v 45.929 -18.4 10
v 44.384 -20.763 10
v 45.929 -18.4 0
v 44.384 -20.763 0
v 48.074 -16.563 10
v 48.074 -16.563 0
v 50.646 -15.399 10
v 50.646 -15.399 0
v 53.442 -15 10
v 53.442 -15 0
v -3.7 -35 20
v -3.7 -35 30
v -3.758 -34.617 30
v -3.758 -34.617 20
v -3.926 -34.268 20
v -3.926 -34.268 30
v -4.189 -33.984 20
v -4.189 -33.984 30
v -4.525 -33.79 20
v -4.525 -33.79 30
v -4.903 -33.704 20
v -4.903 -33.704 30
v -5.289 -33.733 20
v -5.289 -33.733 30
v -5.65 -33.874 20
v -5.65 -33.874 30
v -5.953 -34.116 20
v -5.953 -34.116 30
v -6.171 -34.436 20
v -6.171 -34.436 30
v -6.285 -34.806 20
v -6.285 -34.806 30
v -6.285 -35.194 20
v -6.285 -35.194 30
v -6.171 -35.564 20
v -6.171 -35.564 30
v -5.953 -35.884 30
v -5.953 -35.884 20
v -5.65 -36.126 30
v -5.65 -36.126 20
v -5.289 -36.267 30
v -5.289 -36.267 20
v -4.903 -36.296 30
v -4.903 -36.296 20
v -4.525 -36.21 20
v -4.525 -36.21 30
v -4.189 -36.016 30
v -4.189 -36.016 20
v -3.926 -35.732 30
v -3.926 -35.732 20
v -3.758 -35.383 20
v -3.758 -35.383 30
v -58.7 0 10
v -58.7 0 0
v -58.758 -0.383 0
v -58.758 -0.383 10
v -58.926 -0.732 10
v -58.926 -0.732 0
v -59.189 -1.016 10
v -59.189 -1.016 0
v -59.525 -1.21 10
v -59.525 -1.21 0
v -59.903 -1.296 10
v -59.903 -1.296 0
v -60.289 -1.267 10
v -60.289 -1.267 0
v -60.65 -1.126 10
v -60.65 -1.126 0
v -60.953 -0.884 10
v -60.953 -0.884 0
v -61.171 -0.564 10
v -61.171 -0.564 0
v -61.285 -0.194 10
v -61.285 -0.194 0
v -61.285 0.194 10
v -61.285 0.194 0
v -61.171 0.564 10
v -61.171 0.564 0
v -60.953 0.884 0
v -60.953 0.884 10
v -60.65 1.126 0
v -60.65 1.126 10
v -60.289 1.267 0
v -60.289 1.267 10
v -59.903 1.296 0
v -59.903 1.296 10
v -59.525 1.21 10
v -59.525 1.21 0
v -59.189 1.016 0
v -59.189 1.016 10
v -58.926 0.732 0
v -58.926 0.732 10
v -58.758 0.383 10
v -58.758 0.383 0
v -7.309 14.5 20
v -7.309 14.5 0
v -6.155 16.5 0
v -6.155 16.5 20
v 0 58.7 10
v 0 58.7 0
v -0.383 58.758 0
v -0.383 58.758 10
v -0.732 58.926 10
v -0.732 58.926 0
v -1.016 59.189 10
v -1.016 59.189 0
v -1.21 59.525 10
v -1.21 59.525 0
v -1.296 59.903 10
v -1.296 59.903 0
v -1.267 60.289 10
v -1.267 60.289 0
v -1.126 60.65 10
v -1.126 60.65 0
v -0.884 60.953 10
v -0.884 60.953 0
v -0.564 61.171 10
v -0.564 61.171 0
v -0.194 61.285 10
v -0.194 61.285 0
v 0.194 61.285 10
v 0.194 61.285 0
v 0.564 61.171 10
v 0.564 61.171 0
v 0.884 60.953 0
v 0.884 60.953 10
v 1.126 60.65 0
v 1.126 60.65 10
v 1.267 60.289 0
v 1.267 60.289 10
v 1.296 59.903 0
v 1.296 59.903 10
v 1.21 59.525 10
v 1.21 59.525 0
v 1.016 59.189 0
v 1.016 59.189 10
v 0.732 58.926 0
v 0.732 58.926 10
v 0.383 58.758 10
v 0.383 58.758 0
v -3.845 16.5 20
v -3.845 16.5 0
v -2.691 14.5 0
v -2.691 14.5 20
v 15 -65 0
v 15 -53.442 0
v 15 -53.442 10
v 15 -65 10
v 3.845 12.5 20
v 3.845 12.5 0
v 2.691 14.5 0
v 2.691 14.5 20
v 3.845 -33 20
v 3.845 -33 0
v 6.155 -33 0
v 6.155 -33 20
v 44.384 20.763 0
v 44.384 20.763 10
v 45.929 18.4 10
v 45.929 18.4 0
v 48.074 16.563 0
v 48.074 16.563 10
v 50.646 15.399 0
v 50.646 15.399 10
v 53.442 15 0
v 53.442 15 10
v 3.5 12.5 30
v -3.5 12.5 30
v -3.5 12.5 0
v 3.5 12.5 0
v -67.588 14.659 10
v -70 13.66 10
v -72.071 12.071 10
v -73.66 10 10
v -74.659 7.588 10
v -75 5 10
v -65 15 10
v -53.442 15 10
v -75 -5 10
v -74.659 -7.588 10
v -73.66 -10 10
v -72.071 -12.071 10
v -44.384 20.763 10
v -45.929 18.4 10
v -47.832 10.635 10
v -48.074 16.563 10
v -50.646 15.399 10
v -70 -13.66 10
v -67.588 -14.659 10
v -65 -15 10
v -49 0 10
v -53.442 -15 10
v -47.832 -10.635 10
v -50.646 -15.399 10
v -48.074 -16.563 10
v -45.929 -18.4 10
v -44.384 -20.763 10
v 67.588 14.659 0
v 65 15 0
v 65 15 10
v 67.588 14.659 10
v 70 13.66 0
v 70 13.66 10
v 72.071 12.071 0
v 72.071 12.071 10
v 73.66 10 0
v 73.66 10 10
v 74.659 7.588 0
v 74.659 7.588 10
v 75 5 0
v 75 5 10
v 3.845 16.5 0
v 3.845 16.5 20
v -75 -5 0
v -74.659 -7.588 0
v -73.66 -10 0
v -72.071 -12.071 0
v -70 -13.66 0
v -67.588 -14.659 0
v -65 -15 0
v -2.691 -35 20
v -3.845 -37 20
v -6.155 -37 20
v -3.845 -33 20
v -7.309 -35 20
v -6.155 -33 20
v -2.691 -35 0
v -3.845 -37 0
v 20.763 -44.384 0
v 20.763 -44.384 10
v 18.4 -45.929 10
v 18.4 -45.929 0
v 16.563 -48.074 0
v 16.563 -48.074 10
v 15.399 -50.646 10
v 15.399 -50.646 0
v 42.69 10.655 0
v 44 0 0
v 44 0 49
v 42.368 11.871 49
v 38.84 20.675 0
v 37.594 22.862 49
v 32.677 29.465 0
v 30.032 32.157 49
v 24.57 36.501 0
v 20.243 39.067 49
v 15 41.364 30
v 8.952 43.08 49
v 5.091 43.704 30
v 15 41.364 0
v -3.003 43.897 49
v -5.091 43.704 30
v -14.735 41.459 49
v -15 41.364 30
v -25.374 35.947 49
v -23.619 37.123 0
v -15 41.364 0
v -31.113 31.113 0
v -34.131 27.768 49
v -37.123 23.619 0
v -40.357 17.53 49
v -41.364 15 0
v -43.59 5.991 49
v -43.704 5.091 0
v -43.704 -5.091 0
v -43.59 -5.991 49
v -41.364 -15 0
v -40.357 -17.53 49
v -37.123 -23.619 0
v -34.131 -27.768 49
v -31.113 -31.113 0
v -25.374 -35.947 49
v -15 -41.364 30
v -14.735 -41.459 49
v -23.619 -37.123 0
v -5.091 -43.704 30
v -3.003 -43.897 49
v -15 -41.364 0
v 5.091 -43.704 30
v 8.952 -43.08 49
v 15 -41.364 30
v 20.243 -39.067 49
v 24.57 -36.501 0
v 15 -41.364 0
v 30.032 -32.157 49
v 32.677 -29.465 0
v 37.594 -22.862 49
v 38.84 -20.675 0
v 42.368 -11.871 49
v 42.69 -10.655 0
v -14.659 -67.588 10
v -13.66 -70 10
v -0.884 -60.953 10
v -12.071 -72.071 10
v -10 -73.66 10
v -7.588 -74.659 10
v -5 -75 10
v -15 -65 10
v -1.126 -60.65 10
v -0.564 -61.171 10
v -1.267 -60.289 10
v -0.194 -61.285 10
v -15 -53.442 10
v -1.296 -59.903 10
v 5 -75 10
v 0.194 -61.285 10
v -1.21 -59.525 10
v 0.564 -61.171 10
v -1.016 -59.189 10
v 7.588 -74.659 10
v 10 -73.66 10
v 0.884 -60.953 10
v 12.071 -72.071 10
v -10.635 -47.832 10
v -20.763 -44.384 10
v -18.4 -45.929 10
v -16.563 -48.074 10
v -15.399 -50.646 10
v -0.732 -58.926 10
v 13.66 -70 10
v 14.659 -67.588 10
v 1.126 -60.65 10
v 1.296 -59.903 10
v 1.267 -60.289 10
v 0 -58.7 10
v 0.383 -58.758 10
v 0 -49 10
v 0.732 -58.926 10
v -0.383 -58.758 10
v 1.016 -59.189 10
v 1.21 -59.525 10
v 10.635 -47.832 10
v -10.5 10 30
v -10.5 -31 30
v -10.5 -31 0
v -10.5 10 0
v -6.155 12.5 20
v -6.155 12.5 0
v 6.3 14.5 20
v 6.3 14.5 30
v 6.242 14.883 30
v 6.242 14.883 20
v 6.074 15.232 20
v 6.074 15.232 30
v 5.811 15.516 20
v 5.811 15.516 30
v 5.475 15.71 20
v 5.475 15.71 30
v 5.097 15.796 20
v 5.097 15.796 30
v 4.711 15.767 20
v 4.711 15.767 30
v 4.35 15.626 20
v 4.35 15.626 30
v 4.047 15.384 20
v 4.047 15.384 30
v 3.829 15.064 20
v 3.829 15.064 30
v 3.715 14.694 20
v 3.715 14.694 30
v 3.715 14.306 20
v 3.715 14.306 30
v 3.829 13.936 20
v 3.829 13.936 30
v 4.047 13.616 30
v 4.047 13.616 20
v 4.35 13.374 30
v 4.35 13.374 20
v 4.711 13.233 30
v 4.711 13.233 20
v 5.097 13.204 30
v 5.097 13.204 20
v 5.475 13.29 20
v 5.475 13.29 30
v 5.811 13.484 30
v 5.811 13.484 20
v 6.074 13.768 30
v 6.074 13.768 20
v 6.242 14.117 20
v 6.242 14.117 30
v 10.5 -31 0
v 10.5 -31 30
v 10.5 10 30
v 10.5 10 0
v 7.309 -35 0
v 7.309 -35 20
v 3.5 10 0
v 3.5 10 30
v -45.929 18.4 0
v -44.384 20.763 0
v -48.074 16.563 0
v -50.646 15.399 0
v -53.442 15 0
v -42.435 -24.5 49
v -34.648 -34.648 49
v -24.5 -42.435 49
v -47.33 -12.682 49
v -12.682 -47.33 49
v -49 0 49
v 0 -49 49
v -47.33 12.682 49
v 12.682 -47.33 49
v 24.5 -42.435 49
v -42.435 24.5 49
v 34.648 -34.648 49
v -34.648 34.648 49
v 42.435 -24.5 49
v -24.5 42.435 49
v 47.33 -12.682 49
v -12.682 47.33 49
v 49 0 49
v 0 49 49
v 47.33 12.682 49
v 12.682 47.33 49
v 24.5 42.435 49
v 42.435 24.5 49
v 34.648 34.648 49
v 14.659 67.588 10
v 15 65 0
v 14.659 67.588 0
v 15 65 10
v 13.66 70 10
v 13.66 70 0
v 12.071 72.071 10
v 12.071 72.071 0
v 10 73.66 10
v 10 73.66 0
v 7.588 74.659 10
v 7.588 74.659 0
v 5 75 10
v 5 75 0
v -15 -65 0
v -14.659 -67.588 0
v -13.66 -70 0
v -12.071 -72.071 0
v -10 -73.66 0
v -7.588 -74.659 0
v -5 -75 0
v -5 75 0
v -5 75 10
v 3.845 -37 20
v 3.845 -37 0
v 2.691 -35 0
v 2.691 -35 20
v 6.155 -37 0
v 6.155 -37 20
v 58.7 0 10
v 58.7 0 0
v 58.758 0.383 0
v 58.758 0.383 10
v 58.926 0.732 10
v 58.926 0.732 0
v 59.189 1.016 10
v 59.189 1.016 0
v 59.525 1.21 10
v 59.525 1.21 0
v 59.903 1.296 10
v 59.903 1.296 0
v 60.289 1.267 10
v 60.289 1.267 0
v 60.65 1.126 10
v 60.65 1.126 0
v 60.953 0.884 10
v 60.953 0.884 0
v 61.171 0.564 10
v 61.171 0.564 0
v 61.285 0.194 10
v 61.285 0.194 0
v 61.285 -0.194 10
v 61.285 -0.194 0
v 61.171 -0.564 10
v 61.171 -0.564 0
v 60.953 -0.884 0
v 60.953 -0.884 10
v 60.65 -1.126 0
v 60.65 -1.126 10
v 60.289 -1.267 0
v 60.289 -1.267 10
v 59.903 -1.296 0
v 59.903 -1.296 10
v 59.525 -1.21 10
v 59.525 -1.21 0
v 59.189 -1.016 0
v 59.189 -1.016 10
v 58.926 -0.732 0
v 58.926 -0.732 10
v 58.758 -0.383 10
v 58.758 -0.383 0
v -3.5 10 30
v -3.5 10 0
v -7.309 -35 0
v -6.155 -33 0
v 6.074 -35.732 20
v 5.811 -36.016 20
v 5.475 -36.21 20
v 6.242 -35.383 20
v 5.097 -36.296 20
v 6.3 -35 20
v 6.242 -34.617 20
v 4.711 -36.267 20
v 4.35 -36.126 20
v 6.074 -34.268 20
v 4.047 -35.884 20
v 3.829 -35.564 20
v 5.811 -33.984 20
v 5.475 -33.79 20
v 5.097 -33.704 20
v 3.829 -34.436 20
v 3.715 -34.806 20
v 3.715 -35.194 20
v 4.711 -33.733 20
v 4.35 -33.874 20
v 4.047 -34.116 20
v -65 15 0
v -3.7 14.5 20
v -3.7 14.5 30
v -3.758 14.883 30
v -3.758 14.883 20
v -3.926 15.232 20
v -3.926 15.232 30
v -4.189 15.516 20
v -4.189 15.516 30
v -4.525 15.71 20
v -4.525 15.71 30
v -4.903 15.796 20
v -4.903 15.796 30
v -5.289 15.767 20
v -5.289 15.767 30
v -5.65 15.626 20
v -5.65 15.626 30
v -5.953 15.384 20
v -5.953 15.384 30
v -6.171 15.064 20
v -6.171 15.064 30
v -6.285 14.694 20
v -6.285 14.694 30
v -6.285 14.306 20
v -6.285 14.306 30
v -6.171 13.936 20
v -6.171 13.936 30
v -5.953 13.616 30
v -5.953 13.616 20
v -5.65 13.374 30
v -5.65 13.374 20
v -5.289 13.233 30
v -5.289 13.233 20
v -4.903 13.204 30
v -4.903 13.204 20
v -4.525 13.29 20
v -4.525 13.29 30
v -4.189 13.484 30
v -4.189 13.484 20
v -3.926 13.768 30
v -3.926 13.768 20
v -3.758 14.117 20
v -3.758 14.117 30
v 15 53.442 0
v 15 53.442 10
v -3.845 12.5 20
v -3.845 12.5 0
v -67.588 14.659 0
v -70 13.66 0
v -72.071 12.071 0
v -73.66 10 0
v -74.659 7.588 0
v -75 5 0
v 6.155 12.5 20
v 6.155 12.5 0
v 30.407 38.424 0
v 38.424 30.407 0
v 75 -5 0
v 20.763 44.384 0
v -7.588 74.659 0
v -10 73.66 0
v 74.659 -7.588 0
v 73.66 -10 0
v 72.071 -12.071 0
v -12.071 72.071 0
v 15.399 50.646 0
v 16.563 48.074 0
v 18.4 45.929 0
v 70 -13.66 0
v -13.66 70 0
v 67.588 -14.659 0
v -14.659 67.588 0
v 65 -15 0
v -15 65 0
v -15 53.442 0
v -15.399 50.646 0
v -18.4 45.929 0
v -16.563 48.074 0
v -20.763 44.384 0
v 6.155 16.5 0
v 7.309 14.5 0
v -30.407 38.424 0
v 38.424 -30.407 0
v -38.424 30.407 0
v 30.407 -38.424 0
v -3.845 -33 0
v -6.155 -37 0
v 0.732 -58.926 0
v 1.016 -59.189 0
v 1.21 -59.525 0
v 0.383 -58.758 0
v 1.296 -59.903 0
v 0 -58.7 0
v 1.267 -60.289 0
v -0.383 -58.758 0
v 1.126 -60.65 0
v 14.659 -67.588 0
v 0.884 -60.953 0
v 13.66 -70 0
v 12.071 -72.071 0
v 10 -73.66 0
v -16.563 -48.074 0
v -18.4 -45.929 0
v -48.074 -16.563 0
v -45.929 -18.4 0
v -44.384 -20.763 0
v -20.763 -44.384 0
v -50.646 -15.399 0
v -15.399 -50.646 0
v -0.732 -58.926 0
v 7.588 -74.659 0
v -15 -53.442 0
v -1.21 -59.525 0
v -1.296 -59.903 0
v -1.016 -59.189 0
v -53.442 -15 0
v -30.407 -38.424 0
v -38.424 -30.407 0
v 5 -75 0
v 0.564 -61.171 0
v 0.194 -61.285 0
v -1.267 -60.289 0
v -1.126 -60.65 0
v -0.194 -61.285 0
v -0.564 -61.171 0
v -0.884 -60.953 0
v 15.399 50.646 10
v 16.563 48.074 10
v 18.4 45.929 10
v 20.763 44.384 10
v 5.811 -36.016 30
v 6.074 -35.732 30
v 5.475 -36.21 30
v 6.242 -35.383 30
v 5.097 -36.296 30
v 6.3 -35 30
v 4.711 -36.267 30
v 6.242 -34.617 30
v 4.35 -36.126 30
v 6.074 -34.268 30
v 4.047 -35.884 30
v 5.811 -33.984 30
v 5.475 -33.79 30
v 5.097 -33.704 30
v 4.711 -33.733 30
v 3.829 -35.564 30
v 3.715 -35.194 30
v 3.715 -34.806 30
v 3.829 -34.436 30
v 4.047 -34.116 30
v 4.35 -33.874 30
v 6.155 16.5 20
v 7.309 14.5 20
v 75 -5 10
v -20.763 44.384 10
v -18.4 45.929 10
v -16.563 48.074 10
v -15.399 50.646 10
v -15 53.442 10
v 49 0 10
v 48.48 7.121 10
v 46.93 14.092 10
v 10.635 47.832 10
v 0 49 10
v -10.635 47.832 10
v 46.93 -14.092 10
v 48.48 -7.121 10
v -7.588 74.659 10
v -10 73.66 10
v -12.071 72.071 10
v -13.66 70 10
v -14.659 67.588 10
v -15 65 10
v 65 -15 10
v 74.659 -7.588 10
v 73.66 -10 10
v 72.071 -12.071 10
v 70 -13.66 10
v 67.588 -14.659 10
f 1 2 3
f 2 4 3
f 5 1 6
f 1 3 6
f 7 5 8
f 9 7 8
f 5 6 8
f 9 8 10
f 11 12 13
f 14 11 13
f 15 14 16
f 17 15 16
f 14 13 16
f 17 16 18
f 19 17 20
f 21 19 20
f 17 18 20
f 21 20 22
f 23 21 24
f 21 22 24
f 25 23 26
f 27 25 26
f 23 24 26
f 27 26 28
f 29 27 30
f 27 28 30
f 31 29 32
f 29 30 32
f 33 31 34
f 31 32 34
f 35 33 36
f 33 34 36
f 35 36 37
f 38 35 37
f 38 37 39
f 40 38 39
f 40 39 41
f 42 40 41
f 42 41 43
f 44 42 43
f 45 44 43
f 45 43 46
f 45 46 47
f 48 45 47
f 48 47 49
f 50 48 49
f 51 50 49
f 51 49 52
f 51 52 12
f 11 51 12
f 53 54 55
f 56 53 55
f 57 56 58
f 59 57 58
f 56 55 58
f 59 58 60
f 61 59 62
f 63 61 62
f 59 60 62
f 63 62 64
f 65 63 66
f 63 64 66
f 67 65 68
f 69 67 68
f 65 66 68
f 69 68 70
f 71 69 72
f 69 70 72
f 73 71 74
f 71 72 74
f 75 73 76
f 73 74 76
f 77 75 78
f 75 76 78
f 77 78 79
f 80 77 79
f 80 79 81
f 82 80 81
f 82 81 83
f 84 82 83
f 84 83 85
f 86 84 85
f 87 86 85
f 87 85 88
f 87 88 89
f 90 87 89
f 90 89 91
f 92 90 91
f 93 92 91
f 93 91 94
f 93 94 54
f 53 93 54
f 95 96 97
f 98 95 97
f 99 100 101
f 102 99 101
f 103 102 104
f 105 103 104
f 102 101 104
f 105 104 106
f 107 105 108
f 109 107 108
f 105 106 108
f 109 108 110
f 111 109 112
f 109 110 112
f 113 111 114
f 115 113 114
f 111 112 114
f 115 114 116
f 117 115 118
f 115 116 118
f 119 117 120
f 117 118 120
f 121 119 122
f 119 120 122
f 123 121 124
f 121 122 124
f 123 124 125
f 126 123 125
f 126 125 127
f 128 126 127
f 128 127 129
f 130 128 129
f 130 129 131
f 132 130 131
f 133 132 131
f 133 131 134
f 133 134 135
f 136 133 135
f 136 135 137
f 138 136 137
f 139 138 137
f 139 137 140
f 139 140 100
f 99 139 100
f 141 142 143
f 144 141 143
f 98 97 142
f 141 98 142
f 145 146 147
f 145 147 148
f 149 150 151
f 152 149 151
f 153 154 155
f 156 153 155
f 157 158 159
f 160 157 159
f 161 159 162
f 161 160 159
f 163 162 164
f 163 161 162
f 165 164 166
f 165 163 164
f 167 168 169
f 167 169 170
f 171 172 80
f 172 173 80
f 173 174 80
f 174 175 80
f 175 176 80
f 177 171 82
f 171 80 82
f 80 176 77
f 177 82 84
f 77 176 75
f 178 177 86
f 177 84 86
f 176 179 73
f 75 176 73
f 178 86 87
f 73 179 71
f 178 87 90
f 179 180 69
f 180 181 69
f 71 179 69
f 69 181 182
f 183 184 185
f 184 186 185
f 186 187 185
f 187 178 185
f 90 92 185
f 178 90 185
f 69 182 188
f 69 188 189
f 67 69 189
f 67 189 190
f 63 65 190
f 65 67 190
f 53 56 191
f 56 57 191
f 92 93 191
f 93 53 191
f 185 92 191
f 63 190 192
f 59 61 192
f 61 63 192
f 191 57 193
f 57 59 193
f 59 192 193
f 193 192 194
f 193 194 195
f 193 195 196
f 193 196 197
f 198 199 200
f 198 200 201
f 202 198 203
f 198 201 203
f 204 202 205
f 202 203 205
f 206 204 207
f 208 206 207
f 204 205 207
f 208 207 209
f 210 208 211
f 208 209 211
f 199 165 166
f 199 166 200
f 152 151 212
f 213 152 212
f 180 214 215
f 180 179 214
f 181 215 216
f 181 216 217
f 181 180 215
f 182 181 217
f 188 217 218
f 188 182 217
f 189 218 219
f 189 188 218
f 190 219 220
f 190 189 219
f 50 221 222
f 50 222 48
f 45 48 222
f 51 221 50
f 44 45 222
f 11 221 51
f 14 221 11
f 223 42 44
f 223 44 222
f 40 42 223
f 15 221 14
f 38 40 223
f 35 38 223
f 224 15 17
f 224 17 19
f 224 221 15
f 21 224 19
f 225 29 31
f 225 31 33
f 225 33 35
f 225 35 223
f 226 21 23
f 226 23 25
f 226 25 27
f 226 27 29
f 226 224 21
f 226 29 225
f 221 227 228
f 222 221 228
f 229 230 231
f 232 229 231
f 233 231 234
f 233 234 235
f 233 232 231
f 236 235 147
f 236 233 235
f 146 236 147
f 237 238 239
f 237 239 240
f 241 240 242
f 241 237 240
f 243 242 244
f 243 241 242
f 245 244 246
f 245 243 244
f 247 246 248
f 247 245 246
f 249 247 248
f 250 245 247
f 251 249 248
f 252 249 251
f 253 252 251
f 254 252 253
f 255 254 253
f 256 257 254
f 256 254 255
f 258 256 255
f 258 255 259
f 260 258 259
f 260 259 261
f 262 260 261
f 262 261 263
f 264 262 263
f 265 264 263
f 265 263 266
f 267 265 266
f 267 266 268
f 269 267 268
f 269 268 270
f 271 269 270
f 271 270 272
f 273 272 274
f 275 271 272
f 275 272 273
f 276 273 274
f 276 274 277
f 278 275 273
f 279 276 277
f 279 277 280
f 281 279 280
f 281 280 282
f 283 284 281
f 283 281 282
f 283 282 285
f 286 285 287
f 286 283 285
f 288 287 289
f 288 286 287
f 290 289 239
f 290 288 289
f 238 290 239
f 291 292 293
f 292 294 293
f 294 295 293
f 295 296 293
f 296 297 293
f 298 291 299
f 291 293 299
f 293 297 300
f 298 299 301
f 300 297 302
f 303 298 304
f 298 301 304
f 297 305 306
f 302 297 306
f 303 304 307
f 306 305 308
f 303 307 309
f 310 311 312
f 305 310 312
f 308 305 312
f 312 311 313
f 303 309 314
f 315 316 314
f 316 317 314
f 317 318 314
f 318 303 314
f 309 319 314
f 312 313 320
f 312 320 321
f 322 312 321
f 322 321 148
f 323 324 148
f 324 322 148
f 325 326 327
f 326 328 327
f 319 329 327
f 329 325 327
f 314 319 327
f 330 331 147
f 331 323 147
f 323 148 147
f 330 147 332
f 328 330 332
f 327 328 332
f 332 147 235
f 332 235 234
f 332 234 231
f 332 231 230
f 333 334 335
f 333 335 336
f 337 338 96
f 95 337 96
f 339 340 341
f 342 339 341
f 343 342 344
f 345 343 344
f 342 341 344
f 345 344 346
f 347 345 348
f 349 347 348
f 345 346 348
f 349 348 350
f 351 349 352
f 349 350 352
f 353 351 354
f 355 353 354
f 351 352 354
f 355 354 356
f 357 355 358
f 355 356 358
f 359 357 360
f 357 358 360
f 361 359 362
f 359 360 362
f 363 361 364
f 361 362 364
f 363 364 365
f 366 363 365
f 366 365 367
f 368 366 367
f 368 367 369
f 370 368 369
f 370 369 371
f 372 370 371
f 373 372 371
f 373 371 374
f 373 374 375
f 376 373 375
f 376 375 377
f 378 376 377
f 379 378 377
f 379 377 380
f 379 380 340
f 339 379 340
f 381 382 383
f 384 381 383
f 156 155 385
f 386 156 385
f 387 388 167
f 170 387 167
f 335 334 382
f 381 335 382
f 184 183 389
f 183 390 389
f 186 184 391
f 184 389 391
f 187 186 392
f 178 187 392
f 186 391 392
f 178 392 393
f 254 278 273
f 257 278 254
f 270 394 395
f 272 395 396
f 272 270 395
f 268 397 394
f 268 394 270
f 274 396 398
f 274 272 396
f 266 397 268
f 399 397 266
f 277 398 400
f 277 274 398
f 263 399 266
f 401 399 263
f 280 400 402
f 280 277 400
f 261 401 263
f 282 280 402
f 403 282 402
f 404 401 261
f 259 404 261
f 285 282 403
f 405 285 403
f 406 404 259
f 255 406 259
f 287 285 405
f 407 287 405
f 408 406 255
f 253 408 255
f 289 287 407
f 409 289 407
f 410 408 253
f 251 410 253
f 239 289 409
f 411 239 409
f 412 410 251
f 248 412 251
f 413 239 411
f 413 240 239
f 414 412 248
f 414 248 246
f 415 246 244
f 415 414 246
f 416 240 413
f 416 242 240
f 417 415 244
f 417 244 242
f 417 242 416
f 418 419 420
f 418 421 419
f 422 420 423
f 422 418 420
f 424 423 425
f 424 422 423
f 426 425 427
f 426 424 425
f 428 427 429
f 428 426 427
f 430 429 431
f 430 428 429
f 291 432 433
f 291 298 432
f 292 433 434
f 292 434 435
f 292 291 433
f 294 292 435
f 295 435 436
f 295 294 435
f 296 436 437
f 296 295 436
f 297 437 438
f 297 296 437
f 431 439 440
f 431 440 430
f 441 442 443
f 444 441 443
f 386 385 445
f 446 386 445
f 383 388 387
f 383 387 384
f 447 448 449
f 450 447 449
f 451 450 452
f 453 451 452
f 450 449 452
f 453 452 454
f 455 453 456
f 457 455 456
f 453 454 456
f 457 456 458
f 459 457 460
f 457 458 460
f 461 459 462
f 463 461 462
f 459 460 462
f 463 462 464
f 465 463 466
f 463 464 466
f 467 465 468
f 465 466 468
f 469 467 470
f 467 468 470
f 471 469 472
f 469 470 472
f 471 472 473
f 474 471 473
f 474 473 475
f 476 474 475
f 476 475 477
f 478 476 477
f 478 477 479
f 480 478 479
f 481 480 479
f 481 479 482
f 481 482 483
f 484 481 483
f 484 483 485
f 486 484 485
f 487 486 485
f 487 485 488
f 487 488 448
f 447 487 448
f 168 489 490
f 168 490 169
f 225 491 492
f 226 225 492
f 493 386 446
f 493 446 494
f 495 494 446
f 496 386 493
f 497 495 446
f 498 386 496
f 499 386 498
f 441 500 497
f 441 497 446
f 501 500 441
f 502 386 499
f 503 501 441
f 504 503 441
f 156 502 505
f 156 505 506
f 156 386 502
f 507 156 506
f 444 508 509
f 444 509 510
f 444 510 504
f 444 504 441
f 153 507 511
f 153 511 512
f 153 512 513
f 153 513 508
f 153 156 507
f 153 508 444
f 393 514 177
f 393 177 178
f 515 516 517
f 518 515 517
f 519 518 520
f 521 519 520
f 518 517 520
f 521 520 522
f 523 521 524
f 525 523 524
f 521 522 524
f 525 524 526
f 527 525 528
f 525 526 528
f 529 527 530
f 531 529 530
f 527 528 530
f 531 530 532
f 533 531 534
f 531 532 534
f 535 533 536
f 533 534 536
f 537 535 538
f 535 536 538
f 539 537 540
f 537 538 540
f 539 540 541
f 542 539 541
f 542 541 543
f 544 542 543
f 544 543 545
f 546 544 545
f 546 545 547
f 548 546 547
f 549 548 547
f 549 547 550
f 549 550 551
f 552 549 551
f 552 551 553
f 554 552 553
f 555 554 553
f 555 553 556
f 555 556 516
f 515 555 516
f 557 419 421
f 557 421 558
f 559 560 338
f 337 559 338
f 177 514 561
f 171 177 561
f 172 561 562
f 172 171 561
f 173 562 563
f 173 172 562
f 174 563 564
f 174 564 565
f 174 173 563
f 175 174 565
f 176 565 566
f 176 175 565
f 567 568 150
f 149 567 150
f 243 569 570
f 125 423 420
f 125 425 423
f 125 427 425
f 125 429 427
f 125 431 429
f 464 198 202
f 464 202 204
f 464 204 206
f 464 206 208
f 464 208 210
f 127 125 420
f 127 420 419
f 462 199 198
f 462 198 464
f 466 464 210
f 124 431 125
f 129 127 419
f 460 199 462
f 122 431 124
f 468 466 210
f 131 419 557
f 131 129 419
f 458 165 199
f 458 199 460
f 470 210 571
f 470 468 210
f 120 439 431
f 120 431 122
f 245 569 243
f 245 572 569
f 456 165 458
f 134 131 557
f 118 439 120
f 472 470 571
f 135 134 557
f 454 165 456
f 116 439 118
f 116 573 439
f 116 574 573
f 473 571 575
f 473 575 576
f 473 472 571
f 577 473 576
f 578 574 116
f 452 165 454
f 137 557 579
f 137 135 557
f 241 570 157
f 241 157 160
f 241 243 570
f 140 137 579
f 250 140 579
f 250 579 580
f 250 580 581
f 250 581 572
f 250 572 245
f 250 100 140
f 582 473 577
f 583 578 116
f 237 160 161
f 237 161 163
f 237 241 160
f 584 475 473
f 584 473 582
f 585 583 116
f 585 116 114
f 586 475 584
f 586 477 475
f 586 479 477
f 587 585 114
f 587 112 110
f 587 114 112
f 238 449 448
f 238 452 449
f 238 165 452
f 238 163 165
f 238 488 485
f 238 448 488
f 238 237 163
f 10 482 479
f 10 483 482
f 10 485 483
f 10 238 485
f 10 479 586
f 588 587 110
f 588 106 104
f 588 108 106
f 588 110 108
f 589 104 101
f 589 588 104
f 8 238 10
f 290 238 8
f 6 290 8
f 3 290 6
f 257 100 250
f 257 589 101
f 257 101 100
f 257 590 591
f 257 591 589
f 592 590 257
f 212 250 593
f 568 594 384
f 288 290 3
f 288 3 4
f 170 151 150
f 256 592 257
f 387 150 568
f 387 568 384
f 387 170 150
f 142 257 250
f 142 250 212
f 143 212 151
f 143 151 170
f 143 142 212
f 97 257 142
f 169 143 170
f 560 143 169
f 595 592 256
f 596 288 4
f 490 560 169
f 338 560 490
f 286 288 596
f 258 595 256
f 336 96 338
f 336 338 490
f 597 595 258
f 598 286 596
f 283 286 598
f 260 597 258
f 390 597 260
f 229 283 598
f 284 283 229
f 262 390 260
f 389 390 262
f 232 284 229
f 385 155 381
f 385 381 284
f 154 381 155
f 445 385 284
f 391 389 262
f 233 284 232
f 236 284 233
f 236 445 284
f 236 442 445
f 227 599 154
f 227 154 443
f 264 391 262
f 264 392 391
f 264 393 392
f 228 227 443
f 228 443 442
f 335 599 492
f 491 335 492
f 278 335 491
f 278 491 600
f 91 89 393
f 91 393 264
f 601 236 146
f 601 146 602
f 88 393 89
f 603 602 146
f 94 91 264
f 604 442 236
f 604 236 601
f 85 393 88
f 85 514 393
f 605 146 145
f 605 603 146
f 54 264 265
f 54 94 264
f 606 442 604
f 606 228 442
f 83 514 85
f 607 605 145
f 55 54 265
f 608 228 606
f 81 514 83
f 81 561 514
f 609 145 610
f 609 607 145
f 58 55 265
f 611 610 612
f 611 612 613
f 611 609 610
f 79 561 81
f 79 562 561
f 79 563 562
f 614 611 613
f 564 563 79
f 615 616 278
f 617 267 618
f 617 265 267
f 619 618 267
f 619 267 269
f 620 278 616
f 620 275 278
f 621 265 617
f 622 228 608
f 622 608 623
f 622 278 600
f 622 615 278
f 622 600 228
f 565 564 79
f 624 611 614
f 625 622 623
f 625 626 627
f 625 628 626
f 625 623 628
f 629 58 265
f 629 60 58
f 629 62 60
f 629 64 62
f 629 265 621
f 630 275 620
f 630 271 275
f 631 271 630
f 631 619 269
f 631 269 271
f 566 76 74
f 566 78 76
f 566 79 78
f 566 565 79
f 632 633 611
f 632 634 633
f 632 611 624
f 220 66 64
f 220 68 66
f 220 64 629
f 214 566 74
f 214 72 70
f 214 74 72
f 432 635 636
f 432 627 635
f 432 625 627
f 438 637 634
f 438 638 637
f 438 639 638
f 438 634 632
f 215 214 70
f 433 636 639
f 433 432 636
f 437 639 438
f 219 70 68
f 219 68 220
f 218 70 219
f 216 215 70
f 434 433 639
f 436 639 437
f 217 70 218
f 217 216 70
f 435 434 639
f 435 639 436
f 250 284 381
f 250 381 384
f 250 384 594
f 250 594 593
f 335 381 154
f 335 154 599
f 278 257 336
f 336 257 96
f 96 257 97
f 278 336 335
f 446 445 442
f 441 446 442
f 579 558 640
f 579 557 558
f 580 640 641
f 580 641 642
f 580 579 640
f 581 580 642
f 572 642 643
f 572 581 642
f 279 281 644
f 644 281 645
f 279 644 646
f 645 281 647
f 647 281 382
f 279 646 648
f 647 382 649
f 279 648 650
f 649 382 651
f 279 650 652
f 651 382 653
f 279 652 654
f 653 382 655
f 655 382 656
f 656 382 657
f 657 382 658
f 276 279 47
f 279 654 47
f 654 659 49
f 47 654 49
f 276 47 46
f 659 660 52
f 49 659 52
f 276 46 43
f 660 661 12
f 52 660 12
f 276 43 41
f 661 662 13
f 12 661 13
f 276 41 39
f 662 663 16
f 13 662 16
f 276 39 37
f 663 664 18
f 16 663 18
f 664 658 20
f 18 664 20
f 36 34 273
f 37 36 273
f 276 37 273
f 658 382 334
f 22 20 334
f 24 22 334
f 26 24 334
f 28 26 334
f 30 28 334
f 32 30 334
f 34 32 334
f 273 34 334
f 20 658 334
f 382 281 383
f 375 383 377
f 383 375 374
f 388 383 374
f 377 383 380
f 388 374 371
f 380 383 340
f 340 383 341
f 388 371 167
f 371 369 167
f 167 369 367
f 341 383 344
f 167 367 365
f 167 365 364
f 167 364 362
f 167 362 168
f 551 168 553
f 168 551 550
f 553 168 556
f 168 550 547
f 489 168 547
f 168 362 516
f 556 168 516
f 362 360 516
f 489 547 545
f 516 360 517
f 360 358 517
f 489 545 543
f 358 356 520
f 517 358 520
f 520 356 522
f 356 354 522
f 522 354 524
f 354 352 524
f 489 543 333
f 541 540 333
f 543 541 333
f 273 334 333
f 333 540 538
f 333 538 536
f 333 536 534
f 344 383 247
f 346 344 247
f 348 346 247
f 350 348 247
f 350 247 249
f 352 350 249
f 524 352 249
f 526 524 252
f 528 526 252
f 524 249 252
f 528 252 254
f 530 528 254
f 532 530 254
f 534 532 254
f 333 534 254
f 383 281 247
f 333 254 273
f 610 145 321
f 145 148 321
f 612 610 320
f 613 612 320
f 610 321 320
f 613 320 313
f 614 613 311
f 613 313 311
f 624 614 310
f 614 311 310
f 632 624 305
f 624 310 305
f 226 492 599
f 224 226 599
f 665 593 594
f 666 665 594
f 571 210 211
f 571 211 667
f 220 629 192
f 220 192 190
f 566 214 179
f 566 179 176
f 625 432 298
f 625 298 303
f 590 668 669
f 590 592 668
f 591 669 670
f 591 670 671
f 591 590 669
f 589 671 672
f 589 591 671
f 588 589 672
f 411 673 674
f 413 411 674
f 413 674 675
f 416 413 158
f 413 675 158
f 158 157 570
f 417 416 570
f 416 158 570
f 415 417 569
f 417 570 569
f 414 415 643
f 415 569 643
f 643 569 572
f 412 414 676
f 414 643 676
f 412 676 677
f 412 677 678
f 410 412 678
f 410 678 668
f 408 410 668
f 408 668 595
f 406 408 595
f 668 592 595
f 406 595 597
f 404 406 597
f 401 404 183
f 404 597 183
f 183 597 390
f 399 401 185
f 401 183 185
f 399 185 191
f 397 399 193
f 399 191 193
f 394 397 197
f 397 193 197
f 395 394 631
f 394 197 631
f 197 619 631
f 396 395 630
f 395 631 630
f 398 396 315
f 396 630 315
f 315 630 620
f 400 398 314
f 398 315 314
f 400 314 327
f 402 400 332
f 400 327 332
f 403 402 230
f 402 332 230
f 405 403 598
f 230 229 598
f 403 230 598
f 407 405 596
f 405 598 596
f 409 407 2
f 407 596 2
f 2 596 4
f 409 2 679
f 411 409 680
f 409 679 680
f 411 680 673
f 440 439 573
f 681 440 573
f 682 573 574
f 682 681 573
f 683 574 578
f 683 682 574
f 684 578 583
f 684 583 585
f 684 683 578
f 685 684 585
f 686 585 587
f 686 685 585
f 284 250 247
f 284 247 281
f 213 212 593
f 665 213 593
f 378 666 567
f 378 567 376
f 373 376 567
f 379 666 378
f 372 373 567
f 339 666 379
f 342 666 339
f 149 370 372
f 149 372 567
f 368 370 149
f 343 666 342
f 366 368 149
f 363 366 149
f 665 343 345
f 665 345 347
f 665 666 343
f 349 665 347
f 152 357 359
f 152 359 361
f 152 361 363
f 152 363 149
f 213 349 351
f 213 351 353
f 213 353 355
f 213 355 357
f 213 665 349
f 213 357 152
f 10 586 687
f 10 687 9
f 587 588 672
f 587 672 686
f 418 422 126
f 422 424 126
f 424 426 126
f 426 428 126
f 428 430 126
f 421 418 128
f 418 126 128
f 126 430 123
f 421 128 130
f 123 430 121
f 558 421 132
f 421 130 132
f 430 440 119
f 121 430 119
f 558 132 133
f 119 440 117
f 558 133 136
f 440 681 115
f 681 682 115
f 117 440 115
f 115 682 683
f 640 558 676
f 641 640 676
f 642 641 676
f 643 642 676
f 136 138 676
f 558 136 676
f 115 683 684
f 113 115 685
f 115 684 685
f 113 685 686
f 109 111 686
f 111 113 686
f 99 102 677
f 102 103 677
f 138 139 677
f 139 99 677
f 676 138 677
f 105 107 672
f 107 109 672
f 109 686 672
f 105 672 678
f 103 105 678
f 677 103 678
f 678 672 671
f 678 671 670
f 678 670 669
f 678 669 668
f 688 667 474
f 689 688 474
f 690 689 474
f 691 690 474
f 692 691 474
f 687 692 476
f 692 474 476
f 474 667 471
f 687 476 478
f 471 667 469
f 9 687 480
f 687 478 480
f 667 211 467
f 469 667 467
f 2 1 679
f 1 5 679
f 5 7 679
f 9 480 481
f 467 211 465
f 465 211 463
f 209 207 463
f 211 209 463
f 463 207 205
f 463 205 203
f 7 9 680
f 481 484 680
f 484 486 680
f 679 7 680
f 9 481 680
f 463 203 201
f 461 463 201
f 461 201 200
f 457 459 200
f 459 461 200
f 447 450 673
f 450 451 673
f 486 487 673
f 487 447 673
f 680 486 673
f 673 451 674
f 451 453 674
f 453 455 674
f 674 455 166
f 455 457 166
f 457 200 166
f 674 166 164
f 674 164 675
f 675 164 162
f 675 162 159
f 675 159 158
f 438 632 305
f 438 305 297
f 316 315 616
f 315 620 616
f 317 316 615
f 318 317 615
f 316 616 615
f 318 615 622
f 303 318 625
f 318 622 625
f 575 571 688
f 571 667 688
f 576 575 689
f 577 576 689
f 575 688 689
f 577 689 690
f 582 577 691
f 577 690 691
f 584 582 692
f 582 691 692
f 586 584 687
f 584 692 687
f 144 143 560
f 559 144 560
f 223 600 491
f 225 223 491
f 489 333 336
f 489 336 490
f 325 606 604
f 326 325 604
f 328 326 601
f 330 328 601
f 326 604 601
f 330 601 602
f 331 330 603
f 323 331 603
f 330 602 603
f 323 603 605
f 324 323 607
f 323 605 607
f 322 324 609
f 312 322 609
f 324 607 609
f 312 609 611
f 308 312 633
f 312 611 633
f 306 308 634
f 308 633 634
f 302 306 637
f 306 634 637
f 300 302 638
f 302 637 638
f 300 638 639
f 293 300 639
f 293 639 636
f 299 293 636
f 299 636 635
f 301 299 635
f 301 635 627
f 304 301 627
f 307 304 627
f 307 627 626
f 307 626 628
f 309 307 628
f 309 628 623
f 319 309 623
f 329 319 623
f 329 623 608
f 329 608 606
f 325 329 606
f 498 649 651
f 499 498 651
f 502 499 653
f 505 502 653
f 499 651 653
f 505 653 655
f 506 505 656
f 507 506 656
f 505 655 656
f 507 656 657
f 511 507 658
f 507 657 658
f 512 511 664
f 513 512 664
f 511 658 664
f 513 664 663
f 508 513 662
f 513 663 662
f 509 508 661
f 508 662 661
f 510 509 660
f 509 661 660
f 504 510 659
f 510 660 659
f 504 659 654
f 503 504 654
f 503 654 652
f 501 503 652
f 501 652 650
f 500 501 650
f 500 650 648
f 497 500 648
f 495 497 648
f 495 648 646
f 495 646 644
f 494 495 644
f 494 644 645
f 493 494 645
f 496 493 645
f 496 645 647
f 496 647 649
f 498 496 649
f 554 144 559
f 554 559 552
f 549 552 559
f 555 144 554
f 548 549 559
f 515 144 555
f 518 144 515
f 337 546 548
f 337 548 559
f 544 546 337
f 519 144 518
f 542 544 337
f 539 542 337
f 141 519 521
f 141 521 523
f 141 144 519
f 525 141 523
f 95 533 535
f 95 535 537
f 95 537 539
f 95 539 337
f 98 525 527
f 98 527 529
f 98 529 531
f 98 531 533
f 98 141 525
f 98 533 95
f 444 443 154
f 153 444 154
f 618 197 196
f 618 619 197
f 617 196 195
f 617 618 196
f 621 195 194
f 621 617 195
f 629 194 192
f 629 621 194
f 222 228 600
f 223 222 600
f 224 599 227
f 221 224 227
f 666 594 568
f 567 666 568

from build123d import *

# Parameters (mm, degrees)
SZKIC1_R                    = 49
SZKIC1_R_2                  = 44
DODANIE_WYCI_GNI_CIE1_DEPTH = 49
DODANIE_WYCI_GNI_CIE2_DEPTH = 30
SZKIC3_W                    = 21
SZKIC3_H                    = 41
WYTNIJ_WYCI_GNI_CIE1_DEPTH  = 30
WYTNIJ_WYCI_GNI_CIE2_DEPTH  = 20
OTW_R_POD_RUB_M21_D         = 2.6
WYTNIJ_WYCI_GNI_CIE3_REACH  = 77.512
SZKIC8_W                    = 7
SZKIC8_H                    = 5
DODANIE_WYCI_GNI_CIE3_DEPTH = 10
OTW_R_POD_RUB_M22_D         = 2.6
SZYK_KO_OWY1_COUNT          = 4
ZAOKR_GLENIE1_R             = 10


with BuildPart() as part:
    # Szkic1 → Dodanie-wyciągnięcie1 (new body)
    with BuildSketch(Plane.XY):
        Circle(SZKIC1_R)
        Circle(SZKIC1_R_2, mode=Mode.SUBTRACT)
    extrude(amount=DODANIE_WYCI_GNI_CIE1_DEPTH)

    # Szkic2 → Dodanie-wyciągnięcie2 (add)
    with BuildSketch(Plane.XY):
        with BuildLine():
            Line((15, 46.647615159), (15, -46.647615159))
            ThreePointArc((15, -46.647615159), (0, -49), (-15, -46.647615159))
            Line((-15, -46.647615159), (-15, 46.647615159))
            ThreePointArc((-15, 46.647615159), (0, 49), (15, 46.647615159))
        make_face()
    extrude(amount=DODANIE_WYCI_GNI_CIE2_DEPTH)

    # Szkic3 → Wytnij-wyciągnięcie1 (cut)
    with BuildSketch(Plane.XY.offset(30)):
        with Locations((0, -10.5)):
            Rectangle(SZKIC3_W, SZKIC3_H)
    extrude(amount=-WYTNIJ_WYCI_GNI_CIE1_DEPTH, mode=Mode.SUBTRACT)

    # Szkic5 → Wytnij-wyciągnięcie2 (cut)
    with BuildSketch(Plane(origin=(0, 0, 0), x_dir=(-1, 0, 0), z_dir=(0, 0, -1))):
        Polygon((6.154700538, -33), (3.845299462, -33), (2.690598923, -35), (3.845299462, -37), (6.154700538, -37), (7.309401077, -35), align=None)
    wytnij_wyci_gni_cie2 = extrude(amount=-WYTNIJ_WYCI_GNI_CIE2_DEPTH, mode=Mode.SUBTRACT)

    # Szkic-szyk1: Wytnij-wyciągnięcie2 at 3 more places
    with Locations((0, 49.5, 0), (10, 49.5, 0), (10, 0, 0)):
        add(wytnij_wyci_gni_cie2, mode=Mode.SUBTRACT)

    # Otwór pod śrubę M21 (through all)
    with Locations(Plane(origin=(0, 0, 20), x_dir=(-1, 0, 0), z_dir=(0, 0, -1))):
        with Locations((-5, 14.5)):
            otw_r_pod_rub_m21 = Hole(OTW_R_POD_RUB_M21_D / 2)

    # Szkic-szyk2: Otwór pod śrubę M21 at 3 more places
    with Locations((-10, 0, 0), (0, -49.5, 0), (-10, -49.5, 0)):
        add(otw_r_pod_rub_m21, mode=Mode.SUBTRACT)

    # Szkic8 → Wytnij-wyciągnięcie3 (cut, up to next)
    with BuildSketch(Plane.XY.offset(30), mode=Mode.PRIVATE) as wytnij_wyci_gni_cie3_sk1:
        with Locations((0, 10)):
            Rectangle(SZKIC8_W, SZKIC8_H)
    wytnij_wyci_gni_cie3_tool1 = extrude(wytnij_wyci_gni_cie3_sk1.sketch, amount=-WYTNIJ_WYCI_GNI_CIE3_REACH, mode=Mode.PRIVATE) & part.part
    add(wytnij_wyci_gni_cie3_tool1.solids().sort_by_distance((0, 10, 30))[0], mode=Mode.SUBTRACT)

    # Szkic9 → Dodanie-wyciągnięcie3 (add)
    with BuildSketch(Plane(origin=(0, 0, 0), x_dir=(-1, 0, 0), z_dir=(0, 0, -1))):
        with BuildLine():
            Line((-75, -15), (-41.36423576, -15))
            ThreePointArc((-41.36423576, -15), (-44, 0), (-41.36423576, 15))
            Line((-41.36423576, 15), (-75, 15))
            Line((-75, 15), (-75, -15))
        make_face()
    dodanie_wyci_gni_cie3 = extrude(amount=-DODANIE_WYCI_GNI_CIE3_DEPTH)

    # Otwór pod śrubę M22 (through all)
    with Locations(Plane.XY.offset(10)):
        with Locations((60, 0)):
            otw_r_pod_rub_m22 = Hole(OTW_R_POD_RUB_M22_D / 2)

    # Szyk kołowy1: Dodanie-wyciągnięcie3, Otwór pod śrubę M22 ×4 about axis
    szyk_ko_owy1_axis = Axis((0, 0, 0), (0, 0, 1))
    add([dodanie_wyci_gni_cie3.rotate(szyk_ko_owy1_axis, i * 360 / SZYK_KO_OWY1_COUNT) for i in range(1, SZYK_KO_OWY1_COUNT)])
    add([otw_r_pod_rub_m22.rotate(szyk_ko_owy1_axis, i * 360 / SZYK_KO_OWY1_COUNT) for i in range(1, SZYK_KO_OWY1_COUNT)], mode=Mode.SUBTRACT)

    # Zaokrąglenie1
    zaokr_glenie1_edges = [part.edges().sort_by_distance(p)[0] for p in [
        (46.647615159, -15, 5),
        (46.647615159, 15, 5),
        (75, 15, 5),
        (75, -15, 5),
        (15, -46.647615159, 5),
        (15, -75, 5),
        (-15, -75, 5),
        (-15, -46.647615159, 5),
        (-46.647615159, -15, 5),
        (-75, -15, 5),
        (-75, 15, 5),
        (-46.647615159, 15, 5),
        (-15, 46.647615159, 5),
        (-15, 75, 5),
        (15, 75, 5),
        (15, 46.647615159, 5),
    ]]
    fillet(zaokr_glenie1_edges, radius=ZAOKR_GLENIE1_R)


solid = part.part
